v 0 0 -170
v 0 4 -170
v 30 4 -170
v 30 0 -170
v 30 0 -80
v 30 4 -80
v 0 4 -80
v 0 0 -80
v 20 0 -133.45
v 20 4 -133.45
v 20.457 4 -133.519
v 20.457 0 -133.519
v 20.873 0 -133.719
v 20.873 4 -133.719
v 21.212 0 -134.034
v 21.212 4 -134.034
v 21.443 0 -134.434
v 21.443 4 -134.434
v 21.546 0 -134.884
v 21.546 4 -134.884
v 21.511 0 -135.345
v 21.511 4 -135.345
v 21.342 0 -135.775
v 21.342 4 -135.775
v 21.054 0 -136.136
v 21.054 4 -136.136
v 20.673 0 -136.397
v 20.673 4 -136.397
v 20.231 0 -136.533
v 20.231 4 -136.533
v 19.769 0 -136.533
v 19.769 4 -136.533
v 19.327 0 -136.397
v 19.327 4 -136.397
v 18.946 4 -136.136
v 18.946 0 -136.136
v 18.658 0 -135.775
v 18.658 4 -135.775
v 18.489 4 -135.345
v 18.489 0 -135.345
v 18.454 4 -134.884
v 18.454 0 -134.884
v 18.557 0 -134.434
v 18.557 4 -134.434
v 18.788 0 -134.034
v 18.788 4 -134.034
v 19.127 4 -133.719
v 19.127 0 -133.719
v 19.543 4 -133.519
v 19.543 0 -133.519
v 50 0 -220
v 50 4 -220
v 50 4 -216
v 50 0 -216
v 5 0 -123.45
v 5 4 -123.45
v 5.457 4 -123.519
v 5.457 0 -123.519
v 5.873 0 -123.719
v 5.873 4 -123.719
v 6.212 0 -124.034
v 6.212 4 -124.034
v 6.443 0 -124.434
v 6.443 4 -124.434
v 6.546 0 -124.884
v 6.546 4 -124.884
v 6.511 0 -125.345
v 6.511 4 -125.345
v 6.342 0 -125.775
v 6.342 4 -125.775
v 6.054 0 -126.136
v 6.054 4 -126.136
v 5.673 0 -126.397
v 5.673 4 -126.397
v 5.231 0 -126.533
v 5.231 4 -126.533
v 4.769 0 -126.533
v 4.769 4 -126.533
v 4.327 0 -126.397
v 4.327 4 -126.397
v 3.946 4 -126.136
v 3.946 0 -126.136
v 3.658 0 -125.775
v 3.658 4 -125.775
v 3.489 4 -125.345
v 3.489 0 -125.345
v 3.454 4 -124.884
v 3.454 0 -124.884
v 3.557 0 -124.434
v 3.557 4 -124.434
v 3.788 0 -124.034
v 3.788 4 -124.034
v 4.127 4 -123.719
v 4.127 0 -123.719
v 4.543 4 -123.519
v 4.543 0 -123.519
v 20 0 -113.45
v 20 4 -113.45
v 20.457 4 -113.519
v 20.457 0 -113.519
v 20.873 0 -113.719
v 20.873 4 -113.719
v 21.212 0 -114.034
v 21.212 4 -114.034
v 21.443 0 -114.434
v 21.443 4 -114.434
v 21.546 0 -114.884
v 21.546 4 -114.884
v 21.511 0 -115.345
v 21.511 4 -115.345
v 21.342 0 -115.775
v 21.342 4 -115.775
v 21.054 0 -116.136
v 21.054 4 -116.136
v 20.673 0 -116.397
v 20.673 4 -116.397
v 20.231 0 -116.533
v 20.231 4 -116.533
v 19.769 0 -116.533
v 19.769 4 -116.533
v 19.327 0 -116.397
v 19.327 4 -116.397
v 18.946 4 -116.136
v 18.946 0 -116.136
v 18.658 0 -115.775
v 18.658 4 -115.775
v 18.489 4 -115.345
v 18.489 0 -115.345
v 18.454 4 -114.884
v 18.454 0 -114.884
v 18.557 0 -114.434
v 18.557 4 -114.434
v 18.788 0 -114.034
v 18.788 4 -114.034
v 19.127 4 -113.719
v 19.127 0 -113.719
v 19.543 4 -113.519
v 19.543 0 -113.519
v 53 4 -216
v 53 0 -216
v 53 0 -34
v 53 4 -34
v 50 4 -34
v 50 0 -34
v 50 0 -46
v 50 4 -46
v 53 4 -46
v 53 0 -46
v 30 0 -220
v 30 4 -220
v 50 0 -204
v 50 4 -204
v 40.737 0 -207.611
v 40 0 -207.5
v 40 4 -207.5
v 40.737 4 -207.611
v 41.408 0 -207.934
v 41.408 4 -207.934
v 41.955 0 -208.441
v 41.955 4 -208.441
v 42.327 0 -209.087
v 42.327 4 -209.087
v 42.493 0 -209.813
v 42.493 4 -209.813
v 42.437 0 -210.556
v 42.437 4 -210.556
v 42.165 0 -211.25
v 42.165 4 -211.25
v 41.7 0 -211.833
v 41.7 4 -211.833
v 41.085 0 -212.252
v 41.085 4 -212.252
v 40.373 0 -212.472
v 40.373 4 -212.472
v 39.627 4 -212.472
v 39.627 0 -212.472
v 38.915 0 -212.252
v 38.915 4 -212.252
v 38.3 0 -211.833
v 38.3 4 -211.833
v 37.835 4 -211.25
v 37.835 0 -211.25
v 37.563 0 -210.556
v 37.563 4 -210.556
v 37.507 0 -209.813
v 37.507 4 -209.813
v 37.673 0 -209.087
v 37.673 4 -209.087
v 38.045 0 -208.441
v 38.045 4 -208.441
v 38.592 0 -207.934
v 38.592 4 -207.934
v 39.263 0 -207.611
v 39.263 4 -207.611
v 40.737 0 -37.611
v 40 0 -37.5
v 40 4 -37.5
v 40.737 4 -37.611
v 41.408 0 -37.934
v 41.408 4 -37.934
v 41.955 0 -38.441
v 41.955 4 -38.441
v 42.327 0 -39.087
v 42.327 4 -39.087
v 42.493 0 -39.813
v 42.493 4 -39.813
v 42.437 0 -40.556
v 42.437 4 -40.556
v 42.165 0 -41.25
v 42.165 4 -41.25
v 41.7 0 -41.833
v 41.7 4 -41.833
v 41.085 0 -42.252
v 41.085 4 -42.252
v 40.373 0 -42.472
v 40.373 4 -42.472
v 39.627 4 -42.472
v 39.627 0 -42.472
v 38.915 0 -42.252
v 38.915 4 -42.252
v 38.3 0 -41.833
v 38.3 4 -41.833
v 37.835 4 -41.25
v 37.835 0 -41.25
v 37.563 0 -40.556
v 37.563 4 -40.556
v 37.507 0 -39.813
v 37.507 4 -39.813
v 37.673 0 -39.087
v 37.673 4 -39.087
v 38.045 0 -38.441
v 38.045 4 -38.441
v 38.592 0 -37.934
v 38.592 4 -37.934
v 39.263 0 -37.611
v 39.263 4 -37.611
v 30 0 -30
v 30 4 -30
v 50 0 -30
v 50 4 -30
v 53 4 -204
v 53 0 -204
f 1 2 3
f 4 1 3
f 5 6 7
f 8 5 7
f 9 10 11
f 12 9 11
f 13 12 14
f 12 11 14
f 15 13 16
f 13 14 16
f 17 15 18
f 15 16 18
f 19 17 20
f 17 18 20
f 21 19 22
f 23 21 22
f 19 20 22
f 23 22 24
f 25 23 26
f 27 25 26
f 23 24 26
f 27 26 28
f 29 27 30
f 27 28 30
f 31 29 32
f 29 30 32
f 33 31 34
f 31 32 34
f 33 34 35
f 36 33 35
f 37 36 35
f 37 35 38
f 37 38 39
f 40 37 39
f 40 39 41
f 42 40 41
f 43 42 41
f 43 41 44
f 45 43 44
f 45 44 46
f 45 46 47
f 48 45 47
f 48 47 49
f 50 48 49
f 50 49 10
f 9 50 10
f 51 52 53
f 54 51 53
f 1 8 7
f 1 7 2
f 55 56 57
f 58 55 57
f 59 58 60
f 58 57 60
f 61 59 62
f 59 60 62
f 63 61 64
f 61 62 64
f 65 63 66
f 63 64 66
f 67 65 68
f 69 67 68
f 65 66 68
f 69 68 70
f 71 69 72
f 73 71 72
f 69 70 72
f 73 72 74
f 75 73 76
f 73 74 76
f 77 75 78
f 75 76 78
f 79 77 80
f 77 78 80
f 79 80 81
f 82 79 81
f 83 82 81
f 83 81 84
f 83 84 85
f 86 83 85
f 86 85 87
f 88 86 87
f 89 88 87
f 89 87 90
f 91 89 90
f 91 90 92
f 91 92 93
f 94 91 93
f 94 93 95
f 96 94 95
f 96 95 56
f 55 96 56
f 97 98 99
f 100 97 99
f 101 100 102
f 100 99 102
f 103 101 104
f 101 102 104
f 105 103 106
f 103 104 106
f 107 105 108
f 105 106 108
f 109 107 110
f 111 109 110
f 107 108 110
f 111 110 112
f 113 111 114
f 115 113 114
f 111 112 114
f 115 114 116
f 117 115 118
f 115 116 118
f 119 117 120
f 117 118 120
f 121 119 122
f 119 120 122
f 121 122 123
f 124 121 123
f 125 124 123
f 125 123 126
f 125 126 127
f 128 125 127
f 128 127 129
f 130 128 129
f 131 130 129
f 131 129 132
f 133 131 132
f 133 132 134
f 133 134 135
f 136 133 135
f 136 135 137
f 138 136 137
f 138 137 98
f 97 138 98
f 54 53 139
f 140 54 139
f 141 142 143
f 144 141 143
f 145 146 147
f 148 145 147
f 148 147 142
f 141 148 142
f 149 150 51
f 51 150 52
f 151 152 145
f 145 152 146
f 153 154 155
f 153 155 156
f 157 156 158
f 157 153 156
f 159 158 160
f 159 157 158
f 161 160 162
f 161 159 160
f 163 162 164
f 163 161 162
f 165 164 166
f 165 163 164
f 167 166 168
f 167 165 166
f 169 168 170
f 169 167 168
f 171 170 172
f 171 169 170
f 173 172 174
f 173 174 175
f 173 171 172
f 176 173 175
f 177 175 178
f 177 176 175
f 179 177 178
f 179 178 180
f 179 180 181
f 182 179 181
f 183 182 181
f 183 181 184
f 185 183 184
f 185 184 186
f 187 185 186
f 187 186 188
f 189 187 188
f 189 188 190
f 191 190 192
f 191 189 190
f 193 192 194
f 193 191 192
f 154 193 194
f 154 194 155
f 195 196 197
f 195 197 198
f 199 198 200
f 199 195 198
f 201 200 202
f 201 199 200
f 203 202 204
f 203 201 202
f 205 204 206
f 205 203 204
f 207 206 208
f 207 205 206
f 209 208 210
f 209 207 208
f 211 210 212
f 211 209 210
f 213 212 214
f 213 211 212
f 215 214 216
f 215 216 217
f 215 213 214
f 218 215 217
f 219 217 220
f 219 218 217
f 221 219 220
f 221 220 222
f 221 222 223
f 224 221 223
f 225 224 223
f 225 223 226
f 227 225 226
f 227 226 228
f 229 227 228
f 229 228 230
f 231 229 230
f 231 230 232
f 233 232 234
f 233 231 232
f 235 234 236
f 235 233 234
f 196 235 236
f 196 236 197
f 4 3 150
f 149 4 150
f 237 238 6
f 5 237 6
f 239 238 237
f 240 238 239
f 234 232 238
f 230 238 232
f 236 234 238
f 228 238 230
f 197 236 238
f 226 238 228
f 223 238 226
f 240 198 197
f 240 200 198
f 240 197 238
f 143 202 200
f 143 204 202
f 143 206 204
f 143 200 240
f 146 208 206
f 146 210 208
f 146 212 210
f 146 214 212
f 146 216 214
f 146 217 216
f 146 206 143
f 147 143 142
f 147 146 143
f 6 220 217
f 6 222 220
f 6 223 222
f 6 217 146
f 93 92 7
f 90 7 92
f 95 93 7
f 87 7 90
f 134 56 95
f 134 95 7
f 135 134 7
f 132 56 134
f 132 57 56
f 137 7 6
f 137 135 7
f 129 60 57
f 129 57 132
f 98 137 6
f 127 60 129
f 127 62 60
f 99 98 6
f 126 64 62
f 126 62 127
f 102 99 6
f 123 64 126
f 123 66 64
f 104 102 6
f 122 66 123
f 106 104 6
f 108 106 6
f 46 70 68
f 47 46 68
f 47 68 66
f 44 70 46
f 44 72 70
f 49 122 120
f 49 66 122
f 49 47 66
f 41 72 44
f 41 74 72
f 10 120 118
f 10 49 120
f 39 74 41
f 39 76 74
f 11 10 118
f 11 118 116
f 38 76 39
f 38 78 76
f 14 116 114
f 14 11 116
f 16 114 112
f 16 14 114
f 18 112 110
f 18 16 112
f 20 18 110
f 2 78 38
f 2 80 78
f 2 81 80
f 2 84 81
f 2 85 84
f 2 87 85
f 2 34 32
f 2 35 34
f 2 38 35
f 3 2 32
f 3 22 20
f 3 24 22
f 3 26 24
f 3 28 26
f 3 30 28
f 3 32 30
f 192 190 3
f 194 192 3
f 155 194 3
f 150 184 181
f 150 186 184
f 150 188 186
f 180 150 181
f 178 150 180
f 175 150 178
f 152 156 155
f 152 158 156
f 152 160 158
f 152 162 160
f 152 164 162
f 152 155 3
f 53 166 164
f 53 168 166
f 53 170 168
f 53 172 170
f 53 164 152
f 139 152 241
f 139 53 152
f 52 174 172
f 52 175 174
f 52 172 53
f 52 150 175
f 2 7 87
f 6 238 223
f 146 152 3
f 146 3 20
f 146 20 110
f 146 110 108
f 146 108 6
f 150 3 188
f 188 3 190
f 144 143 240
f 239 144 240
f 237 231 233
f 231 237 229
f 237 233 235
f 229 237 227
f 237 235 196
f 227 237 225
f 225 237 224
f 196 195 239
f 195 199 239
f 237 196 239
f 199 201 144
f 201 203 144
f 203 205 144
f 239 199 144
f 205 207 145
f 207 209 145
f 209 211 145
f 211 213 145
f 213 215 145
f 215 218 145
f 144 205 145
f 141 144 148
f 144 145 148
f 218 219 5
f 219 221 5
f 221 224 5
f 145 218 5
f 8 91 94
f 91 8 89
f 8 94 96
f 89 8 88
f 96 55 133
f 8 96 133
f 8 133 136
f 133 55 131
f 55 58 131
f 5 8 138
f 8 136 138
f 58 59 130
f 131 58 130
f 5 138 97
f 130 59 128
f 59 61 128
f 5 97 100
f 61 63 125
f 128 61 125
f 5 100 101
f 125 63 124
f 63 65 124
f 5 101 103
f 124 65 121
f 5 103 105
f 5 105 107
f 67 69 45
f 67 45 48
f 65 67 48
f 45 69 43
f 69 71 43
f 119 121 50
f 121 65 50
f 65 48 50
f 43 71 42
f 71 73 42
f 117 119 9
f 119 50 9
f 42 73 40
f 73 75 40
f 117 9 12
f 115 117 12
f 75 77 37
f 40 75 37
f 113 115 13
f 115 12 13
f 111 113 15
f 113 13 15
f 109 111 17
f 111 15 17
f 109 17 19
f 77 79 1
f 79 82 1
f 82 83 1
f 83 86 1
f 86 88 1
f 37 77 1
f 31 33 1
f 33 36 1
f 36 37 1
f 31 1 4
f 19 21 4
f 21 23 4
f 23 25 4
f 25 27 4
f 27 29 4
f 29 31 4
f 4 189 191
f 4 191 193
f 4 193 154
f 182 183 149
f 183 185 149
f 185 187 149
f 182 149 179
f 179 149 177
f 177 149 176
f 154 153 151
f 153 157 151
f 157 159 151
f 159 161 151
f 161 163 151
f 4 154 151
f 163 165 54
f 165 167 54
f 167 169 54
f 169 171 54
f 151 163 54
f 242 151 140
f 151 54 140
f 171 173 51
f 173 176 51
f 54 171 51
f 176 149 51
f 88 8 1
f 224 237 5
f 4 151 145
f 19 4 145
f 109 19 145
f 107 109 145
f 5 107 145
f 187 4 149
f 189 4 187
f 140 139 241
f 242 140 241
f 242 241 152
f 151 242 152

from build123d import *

# Parameters (mm, degrees)
CROQUIS1_W              = 250
CROQUIS1_H              = 250
CROQUIS1_R              = 2.5
SALIENTE_EXTRUIR1_DEPTH = 4
CORTAR_EXTRUIR1_DEPTH   = 4
CROQUIS3_W              = 150
CROQUIS3_H              = 150
CROQUIS3_W_2            = 100
CROQUIS3_H_2            = 100
SALIENTE_EXTRUIR2_DEPTH = 4
CROQUIS4_R              = 1.55
CORTAR_EXTRUIR2_DEPTH   = 10
CROQUIS5_W              = 150
CROQUIS5_H              = 150
CROQUIS5_W_2            = 100
CROQUIS5_H_2            = 100
CORTAR_EXTRUIR3_DEPTH   = 10
CROQUIS6_W              = 30
CROQUIS6_H              = 50
CROQUIS6_W_2            = 50
CROQUIS6_H_2            = 30
CORTAR_EXTRUIR4_DEPTH   = 10
CROQUIS8_R              = 1.55
CORTAR_EXTRUIR5_DEPTH   = 10
CORTAR_EXTRUIR6_DEPTH   = 10


with BuildPart() as part:
    # Croquis1 → Saliente-Extruir1 (new body)
    with BuildSketch(Plane(origin=(0, 0, 0), x_dir=(1, 0, 0), z_dir=(0, 1, 0))):
        with Locations((125, 125)):
            Rectangle(CROQUIS1_W, CROQUIS1_H)
        with Locations(Location((40, 210, 0), (0, 0, 270))):
            Circle(CROQUIS1_R, mode=Mode.SUBTRACT)
        with Locations(Location((210, 210, 0), (0, 0, 270))):
            Circle(CROQUIS1_R, mode=Mode.SUBTRACT)
        with Locations(Location((210, 40, 0), (0, 0, 270))):
            Circle(CROQUIS1_R, mode=Mode.SUBTRACT)
        with Locations(Location((40, 40, 0), (0, 0, 270))):
            Circle(CROQUIS1_R, mode=Mode.SUBTRACT)
    extrude(amount=SALIENTE_EXTRUIR1_DEPTH)

    # Croquis2 → Cortar-Extruir1 (cut)
    with BuildSketch(Plane(origin=(0, 4, 0), x_dir=(1, 0, 0), z_dir=(0, 1, 0))):
        Polygon((50, 50), (200, 50), (200, 200), (50, 200), (50, 150.09044268), align=None)
    extrude(amount=-CORTAR_EXTRUIR1_DEPTH, mode=Mode.SUBTRACT)

    # Croquis3 → Saliente-Extruir2 (add)
    with BuildSketch(Plane(origin=(0, 4, 0), x_dir=(1, 0, 0), z_dir=(0, 1, 0))):
        with Locations((125, 125)):
            Rectangle(CROQUIS3_W, CROQUIS3_H)
        with Locations((125, 125)):
            Rectangle(CROQUIS3_W_2, CROQUIS3_H_2, mode=Mode.SUBTRACT)
    extrude(amount=-SALIENTE_EXTRUIR2_DEPTH)

    # Croquis4 → Cortar-Extruir2 (cut)
    with BuildSketch(Plane(origin=(0, 4, 0), x_dir=(1, 0, 0), z_dir=(0, 1, 0))):
        with Locations(Location((115, 20, 0), (0, 0, 270))):
            Circle(CROQUIS4_R)
        with Locations(Location((135, 20, 0), (0, 0, 270))):
            Circle(CROQUIS4_R)
        with Locations(Location((125, 5, 0), (0, 0, 270))):
            Circle(CROQUIS4_R)
    extrude(amount=-CORTAR_EXTRUIR2_DEPTH, mode=Mode.SUBTRACT)

    # Croquis5 → Cortar-Extruir3 (cut)
    with BuildSketch(Plane(origin=(0, 4, 0), x_dir=(1, 0, 0), z_dir=(0, 1, 0))):
        with Locations((125, 125)):
            Rectangle(CROQUIS5_W, CROQUIS5_H)
        with Locations((125, 125)):
            Rectangle(CROQUIS5_W_2, CROQUIS5_H_2, mode=Mode.SUBTRACT)
    extrude(amount=-CORTAR_EXTRUIR3_DEPTH, mode=Mode.SUBTRACT)

    # Croquis6 → Cortar-Extruir4 (cut)
    with BuildSketch(Plane(origin=(0, 4, 0), x_dir=(1, 0, 0), z_dir=(0, 1, 0))):
        Polygon((170, 0), (250, 0), (250, 30), (220, 30), (170, 30), align=None)
        with Locations((235, 55)):
            Rectangle(CROQUIS6_W, CROQUIS6_H)
        Polygon((0, 80), (0, 0), (30, 0), (30, 30), (30, 80), align=None)
        with Locations((55, 15)):
            Rectangle(CROQUIS6_W_2, CROQUIS6_H_2)
        Polygon((80, 250), (0, 250), (0, 220), (30, 220), (80, 220), align=None)
        with Locations((15, 195)):
            Rectangle(CROQUIS6_W, CROQUIS6_H)
        Polygon((250, 170), (250, 250), (220, 250), (220, 220), (220, 170), align=None)
        with Locations((195, 235)):
            Rectangle(CROQUIS6_W_2, CROQUIS6_H_2)
    extrude(amount=-CORTAR_EXTRUIR4_DEPTH, mode=Mode.SUBTRACT)

    # Croquis8 → Cortar-Extruir5 (cut)
    with BuildSketch(Plane(origin=(0, 4, 0), x_dir=(1, 0, 0), z_dir=(0, 1, 0))):
        with Locations(Location((125, 5, 0), (0, 0, 270))):
            Circle(CROQUIS8_R)
        with Locations(Location((135, 20, 0), (0, 0, 270))):
            Circle(CROQUIS8_R)
        with Locations(Location((115, 20, 0), (0, 0, 270))):
            Circle(CROQUIS8_R)
        with Locations(Location((20, 135, 0), (0, 0, 270))):
            Circle(CROQUIS8_R)
        with Locations(Location((5, 125, 0), (0, 0, 270))):
            Circle(CROQUIS8_R)
        with Locations(Location((20, 115, 0), (0, 0, 270))):
            Circle(CROQUIS8_R)
        with Locations(Location((135, 230, 0), (0, 0, 270))):
            Circle(CROQUIS8_R)
        with Locations(Location((125, 245, 0), (0, 0, 270))):
            Circle(CROQUIS8_R)
        with Locations(Location((115, 230, 0), (0, 0, 270))):
            Circle(CROQUIS8_R)
        with Locations(Location((230, 115, 0), (0, 0, 270))):
            Circle(CROQUIS8_R)
        with Locations(Location((245, 125, 0), (0, 0, 270))):
            Circle(CROQUIS8_R)
        with Locations(Location((230, 135, 0), (0, 0, 270))):
            Circle(CROQUIS8_R)
    extrude(amount=-CORTAR_EXTRUIR5_DEPTH, mode=Mode.SUBTRACT)

    # Croquis9 → Cortar-Extruir6 (cut)
    with BuildSketch(Plane(origin=(0, 4, 0), x_dir=(1, 0, 0), z_dir=(0, 1, 0))):
        Polygon((50, 0), (250, 0), (250, 250), (50, 250), (50, 216), (53, 216), (53, 204), (50, 204), (50, 46), (53, 46), (53, 34), (50, 34), align=None)
    extrude(amount=-CORTAR_EXTRUIR6_DEPTH, mode=Mode.SUBTRACT)


solid = part.part
